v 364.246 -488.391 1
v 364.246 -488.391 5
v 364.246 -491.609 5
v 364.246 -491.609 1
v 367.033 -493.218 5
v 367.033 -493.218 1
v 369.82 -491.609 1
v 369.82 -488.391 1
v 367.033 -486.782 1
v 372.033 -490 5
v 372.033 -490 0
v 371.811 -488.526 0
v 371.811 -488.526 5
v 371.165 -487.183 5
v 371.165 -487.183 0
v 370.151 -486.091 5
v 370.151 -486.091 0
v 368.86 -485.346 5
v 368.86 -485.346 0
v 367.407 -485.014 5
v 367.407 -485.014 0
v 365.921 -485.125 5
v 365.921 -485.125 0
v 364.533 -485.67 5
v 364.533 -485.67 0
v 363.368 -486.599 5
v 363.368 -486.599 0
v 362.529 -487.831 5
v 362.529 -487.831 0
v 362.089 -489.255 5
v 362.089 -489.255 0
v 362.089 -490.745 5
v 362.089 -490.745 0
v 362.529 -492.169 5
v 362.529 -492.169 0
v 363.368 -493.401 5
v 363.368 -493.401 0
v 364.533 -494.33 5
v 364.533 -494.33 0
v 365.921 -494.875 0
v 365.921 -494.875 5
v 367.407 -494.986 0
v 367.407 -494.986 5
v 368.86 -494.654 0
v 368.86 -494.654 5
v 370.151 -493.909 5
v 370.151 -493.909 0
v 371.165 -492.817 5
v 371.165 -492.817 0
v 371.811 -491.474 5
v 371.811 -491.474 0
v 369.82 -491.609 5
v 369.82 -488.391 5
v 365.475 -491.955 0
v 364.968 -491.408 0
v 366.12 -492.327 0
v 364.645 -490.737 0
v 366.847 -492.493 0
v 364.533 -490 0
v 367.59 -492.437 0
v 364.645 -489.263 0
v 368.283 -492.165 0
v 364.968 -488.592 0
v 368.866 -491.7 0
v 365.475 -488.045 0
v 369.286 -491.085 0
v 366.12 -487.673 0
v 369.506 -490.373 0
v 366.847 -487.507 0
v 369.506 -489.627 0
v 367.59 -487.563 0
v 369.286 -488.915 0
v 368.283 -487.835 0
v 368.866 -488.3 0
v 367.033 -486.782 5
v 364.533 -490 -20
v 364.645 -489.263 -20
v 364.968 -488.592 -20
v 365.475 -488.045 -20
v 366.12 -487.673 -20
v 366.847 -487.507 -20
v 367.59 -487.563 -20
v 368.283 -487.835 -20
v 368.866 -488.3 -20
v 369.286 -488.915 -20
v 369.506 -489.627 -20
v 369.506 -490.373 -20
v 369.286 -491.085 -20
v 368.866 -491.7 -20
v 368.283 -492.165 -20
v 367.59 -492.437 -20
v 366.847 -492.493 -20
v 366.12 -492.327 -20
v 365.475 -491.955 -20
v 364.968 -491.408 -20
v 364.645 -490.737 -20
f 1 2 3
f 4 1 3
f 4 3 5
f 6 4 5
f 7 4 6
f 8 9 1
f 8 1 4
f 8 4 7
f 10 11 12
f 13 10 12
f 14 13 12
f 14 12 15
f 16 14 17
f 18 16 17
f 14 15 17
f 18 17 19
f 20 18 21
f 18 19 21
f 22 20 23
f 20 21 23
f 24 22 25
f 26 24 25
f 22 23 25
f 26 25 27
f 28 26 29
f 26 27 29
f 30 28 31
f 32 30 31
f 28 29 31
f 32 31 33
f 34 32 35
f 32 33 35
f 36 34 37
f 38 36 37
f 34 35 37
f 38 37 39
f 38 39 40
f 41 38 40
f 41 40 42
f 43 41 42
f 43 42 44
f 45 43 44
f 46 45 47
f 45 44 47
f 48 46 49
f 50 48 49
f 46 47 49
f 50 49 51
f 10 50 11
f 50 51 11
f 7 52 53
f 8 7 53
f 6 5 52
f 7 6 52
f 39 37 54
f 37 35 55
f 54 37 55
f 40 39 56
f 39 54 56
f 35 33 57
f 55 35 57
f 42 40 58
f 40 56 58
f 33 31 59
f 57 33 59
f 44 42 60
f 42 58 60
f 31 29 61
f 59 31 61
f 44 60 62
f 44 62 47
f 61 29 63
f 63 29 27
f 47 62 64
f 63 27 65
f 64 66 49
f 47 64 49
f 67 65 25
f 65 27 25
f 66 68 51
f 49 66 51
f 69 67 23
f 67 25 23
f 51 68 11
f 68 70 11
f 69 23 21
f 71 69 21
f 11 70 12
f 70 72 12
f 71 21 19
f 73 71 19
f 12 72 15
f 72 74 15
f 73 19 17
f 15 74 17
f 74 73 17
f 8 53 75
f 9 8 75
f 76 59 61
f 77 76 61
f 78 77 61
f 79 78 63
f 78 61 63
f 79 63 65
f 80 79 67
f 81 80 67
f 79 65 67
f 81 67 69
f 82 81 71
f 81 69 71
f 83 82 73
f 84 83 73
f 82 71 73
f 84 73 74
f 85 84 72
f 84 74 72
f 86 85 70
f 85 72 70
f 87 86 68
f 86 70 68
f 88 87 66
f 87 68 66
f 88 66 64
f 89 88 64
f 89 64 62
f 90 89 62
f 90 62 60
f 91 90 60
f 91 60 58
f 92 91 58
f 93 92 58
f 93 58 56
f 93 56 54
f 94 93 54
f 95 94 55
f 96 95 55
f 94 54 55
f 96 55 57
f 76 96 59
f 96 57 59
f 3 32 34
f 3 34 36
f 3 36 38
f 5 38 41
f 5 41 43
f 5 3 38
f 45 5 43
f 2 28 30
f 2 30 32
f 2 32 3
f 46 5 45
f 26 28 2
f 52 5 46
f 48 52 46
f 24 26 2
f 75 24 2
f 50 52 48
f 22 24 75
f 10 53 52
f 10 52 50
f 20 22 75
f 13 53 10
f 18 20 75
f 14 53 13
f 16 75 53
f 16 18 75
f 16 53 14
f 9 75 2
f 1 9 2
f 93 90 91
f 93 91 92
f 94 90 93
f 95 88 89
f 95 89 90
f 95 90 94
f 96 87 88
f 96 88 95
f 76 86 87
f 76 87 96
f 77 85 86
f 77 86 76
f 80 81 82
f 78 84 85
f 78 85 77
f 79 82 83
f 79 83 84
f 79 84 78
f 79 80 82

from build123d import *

# Parameters (mm, degrees)
SKETCH1_R           = 5
BOSS_EXTRUDE1_DEPTH = 5
SKETCH2_R           = 2.5
BOSS_EXTRUDE2_DEPTH = 20
CUT_EXTRUDE1_DEPTH  = 4


with BuildPart() as part:
    # Sketch1 → Boss-Extrude1 (new body)
    with BuildSketch(Plane.XY):
        with Locations((367.033440134, -490)):
            Circle(SKETCH1_R)
    extrude(amount=BOSS_EXTRUDE1_DEPTH)

    # Sketch2 → Boss-Extrude2 (add)
    with BuildSketch(Plane(origin=(0, 0, 0), x_dir=(-1, 0, 0), z_dir=(0, 0, -1))):
        with Locations((-367.033440134, -490)):
            Circle(SKETCH2_R)
    extrude(amount=BOSS_EXTRUDE2_DEPTH)

    # Sketch3 → Cut-Extrude1 (cut)
    with BuildSketch(Plane.XY.offset(5)):
        Polygon((367.033440134, -493.218193517), (369.820477474, -491.609096758), (369.820477474, -488.390903242), (367.033440134, -486.781806483), (364.246402794, -488.390903242), (364.246402794, -491.609096758), align=None)
    extrude(amount=-CUT_EXTRUDE1_DEPTH, mode=Mode.SUBTRACT)


solid = part.part
